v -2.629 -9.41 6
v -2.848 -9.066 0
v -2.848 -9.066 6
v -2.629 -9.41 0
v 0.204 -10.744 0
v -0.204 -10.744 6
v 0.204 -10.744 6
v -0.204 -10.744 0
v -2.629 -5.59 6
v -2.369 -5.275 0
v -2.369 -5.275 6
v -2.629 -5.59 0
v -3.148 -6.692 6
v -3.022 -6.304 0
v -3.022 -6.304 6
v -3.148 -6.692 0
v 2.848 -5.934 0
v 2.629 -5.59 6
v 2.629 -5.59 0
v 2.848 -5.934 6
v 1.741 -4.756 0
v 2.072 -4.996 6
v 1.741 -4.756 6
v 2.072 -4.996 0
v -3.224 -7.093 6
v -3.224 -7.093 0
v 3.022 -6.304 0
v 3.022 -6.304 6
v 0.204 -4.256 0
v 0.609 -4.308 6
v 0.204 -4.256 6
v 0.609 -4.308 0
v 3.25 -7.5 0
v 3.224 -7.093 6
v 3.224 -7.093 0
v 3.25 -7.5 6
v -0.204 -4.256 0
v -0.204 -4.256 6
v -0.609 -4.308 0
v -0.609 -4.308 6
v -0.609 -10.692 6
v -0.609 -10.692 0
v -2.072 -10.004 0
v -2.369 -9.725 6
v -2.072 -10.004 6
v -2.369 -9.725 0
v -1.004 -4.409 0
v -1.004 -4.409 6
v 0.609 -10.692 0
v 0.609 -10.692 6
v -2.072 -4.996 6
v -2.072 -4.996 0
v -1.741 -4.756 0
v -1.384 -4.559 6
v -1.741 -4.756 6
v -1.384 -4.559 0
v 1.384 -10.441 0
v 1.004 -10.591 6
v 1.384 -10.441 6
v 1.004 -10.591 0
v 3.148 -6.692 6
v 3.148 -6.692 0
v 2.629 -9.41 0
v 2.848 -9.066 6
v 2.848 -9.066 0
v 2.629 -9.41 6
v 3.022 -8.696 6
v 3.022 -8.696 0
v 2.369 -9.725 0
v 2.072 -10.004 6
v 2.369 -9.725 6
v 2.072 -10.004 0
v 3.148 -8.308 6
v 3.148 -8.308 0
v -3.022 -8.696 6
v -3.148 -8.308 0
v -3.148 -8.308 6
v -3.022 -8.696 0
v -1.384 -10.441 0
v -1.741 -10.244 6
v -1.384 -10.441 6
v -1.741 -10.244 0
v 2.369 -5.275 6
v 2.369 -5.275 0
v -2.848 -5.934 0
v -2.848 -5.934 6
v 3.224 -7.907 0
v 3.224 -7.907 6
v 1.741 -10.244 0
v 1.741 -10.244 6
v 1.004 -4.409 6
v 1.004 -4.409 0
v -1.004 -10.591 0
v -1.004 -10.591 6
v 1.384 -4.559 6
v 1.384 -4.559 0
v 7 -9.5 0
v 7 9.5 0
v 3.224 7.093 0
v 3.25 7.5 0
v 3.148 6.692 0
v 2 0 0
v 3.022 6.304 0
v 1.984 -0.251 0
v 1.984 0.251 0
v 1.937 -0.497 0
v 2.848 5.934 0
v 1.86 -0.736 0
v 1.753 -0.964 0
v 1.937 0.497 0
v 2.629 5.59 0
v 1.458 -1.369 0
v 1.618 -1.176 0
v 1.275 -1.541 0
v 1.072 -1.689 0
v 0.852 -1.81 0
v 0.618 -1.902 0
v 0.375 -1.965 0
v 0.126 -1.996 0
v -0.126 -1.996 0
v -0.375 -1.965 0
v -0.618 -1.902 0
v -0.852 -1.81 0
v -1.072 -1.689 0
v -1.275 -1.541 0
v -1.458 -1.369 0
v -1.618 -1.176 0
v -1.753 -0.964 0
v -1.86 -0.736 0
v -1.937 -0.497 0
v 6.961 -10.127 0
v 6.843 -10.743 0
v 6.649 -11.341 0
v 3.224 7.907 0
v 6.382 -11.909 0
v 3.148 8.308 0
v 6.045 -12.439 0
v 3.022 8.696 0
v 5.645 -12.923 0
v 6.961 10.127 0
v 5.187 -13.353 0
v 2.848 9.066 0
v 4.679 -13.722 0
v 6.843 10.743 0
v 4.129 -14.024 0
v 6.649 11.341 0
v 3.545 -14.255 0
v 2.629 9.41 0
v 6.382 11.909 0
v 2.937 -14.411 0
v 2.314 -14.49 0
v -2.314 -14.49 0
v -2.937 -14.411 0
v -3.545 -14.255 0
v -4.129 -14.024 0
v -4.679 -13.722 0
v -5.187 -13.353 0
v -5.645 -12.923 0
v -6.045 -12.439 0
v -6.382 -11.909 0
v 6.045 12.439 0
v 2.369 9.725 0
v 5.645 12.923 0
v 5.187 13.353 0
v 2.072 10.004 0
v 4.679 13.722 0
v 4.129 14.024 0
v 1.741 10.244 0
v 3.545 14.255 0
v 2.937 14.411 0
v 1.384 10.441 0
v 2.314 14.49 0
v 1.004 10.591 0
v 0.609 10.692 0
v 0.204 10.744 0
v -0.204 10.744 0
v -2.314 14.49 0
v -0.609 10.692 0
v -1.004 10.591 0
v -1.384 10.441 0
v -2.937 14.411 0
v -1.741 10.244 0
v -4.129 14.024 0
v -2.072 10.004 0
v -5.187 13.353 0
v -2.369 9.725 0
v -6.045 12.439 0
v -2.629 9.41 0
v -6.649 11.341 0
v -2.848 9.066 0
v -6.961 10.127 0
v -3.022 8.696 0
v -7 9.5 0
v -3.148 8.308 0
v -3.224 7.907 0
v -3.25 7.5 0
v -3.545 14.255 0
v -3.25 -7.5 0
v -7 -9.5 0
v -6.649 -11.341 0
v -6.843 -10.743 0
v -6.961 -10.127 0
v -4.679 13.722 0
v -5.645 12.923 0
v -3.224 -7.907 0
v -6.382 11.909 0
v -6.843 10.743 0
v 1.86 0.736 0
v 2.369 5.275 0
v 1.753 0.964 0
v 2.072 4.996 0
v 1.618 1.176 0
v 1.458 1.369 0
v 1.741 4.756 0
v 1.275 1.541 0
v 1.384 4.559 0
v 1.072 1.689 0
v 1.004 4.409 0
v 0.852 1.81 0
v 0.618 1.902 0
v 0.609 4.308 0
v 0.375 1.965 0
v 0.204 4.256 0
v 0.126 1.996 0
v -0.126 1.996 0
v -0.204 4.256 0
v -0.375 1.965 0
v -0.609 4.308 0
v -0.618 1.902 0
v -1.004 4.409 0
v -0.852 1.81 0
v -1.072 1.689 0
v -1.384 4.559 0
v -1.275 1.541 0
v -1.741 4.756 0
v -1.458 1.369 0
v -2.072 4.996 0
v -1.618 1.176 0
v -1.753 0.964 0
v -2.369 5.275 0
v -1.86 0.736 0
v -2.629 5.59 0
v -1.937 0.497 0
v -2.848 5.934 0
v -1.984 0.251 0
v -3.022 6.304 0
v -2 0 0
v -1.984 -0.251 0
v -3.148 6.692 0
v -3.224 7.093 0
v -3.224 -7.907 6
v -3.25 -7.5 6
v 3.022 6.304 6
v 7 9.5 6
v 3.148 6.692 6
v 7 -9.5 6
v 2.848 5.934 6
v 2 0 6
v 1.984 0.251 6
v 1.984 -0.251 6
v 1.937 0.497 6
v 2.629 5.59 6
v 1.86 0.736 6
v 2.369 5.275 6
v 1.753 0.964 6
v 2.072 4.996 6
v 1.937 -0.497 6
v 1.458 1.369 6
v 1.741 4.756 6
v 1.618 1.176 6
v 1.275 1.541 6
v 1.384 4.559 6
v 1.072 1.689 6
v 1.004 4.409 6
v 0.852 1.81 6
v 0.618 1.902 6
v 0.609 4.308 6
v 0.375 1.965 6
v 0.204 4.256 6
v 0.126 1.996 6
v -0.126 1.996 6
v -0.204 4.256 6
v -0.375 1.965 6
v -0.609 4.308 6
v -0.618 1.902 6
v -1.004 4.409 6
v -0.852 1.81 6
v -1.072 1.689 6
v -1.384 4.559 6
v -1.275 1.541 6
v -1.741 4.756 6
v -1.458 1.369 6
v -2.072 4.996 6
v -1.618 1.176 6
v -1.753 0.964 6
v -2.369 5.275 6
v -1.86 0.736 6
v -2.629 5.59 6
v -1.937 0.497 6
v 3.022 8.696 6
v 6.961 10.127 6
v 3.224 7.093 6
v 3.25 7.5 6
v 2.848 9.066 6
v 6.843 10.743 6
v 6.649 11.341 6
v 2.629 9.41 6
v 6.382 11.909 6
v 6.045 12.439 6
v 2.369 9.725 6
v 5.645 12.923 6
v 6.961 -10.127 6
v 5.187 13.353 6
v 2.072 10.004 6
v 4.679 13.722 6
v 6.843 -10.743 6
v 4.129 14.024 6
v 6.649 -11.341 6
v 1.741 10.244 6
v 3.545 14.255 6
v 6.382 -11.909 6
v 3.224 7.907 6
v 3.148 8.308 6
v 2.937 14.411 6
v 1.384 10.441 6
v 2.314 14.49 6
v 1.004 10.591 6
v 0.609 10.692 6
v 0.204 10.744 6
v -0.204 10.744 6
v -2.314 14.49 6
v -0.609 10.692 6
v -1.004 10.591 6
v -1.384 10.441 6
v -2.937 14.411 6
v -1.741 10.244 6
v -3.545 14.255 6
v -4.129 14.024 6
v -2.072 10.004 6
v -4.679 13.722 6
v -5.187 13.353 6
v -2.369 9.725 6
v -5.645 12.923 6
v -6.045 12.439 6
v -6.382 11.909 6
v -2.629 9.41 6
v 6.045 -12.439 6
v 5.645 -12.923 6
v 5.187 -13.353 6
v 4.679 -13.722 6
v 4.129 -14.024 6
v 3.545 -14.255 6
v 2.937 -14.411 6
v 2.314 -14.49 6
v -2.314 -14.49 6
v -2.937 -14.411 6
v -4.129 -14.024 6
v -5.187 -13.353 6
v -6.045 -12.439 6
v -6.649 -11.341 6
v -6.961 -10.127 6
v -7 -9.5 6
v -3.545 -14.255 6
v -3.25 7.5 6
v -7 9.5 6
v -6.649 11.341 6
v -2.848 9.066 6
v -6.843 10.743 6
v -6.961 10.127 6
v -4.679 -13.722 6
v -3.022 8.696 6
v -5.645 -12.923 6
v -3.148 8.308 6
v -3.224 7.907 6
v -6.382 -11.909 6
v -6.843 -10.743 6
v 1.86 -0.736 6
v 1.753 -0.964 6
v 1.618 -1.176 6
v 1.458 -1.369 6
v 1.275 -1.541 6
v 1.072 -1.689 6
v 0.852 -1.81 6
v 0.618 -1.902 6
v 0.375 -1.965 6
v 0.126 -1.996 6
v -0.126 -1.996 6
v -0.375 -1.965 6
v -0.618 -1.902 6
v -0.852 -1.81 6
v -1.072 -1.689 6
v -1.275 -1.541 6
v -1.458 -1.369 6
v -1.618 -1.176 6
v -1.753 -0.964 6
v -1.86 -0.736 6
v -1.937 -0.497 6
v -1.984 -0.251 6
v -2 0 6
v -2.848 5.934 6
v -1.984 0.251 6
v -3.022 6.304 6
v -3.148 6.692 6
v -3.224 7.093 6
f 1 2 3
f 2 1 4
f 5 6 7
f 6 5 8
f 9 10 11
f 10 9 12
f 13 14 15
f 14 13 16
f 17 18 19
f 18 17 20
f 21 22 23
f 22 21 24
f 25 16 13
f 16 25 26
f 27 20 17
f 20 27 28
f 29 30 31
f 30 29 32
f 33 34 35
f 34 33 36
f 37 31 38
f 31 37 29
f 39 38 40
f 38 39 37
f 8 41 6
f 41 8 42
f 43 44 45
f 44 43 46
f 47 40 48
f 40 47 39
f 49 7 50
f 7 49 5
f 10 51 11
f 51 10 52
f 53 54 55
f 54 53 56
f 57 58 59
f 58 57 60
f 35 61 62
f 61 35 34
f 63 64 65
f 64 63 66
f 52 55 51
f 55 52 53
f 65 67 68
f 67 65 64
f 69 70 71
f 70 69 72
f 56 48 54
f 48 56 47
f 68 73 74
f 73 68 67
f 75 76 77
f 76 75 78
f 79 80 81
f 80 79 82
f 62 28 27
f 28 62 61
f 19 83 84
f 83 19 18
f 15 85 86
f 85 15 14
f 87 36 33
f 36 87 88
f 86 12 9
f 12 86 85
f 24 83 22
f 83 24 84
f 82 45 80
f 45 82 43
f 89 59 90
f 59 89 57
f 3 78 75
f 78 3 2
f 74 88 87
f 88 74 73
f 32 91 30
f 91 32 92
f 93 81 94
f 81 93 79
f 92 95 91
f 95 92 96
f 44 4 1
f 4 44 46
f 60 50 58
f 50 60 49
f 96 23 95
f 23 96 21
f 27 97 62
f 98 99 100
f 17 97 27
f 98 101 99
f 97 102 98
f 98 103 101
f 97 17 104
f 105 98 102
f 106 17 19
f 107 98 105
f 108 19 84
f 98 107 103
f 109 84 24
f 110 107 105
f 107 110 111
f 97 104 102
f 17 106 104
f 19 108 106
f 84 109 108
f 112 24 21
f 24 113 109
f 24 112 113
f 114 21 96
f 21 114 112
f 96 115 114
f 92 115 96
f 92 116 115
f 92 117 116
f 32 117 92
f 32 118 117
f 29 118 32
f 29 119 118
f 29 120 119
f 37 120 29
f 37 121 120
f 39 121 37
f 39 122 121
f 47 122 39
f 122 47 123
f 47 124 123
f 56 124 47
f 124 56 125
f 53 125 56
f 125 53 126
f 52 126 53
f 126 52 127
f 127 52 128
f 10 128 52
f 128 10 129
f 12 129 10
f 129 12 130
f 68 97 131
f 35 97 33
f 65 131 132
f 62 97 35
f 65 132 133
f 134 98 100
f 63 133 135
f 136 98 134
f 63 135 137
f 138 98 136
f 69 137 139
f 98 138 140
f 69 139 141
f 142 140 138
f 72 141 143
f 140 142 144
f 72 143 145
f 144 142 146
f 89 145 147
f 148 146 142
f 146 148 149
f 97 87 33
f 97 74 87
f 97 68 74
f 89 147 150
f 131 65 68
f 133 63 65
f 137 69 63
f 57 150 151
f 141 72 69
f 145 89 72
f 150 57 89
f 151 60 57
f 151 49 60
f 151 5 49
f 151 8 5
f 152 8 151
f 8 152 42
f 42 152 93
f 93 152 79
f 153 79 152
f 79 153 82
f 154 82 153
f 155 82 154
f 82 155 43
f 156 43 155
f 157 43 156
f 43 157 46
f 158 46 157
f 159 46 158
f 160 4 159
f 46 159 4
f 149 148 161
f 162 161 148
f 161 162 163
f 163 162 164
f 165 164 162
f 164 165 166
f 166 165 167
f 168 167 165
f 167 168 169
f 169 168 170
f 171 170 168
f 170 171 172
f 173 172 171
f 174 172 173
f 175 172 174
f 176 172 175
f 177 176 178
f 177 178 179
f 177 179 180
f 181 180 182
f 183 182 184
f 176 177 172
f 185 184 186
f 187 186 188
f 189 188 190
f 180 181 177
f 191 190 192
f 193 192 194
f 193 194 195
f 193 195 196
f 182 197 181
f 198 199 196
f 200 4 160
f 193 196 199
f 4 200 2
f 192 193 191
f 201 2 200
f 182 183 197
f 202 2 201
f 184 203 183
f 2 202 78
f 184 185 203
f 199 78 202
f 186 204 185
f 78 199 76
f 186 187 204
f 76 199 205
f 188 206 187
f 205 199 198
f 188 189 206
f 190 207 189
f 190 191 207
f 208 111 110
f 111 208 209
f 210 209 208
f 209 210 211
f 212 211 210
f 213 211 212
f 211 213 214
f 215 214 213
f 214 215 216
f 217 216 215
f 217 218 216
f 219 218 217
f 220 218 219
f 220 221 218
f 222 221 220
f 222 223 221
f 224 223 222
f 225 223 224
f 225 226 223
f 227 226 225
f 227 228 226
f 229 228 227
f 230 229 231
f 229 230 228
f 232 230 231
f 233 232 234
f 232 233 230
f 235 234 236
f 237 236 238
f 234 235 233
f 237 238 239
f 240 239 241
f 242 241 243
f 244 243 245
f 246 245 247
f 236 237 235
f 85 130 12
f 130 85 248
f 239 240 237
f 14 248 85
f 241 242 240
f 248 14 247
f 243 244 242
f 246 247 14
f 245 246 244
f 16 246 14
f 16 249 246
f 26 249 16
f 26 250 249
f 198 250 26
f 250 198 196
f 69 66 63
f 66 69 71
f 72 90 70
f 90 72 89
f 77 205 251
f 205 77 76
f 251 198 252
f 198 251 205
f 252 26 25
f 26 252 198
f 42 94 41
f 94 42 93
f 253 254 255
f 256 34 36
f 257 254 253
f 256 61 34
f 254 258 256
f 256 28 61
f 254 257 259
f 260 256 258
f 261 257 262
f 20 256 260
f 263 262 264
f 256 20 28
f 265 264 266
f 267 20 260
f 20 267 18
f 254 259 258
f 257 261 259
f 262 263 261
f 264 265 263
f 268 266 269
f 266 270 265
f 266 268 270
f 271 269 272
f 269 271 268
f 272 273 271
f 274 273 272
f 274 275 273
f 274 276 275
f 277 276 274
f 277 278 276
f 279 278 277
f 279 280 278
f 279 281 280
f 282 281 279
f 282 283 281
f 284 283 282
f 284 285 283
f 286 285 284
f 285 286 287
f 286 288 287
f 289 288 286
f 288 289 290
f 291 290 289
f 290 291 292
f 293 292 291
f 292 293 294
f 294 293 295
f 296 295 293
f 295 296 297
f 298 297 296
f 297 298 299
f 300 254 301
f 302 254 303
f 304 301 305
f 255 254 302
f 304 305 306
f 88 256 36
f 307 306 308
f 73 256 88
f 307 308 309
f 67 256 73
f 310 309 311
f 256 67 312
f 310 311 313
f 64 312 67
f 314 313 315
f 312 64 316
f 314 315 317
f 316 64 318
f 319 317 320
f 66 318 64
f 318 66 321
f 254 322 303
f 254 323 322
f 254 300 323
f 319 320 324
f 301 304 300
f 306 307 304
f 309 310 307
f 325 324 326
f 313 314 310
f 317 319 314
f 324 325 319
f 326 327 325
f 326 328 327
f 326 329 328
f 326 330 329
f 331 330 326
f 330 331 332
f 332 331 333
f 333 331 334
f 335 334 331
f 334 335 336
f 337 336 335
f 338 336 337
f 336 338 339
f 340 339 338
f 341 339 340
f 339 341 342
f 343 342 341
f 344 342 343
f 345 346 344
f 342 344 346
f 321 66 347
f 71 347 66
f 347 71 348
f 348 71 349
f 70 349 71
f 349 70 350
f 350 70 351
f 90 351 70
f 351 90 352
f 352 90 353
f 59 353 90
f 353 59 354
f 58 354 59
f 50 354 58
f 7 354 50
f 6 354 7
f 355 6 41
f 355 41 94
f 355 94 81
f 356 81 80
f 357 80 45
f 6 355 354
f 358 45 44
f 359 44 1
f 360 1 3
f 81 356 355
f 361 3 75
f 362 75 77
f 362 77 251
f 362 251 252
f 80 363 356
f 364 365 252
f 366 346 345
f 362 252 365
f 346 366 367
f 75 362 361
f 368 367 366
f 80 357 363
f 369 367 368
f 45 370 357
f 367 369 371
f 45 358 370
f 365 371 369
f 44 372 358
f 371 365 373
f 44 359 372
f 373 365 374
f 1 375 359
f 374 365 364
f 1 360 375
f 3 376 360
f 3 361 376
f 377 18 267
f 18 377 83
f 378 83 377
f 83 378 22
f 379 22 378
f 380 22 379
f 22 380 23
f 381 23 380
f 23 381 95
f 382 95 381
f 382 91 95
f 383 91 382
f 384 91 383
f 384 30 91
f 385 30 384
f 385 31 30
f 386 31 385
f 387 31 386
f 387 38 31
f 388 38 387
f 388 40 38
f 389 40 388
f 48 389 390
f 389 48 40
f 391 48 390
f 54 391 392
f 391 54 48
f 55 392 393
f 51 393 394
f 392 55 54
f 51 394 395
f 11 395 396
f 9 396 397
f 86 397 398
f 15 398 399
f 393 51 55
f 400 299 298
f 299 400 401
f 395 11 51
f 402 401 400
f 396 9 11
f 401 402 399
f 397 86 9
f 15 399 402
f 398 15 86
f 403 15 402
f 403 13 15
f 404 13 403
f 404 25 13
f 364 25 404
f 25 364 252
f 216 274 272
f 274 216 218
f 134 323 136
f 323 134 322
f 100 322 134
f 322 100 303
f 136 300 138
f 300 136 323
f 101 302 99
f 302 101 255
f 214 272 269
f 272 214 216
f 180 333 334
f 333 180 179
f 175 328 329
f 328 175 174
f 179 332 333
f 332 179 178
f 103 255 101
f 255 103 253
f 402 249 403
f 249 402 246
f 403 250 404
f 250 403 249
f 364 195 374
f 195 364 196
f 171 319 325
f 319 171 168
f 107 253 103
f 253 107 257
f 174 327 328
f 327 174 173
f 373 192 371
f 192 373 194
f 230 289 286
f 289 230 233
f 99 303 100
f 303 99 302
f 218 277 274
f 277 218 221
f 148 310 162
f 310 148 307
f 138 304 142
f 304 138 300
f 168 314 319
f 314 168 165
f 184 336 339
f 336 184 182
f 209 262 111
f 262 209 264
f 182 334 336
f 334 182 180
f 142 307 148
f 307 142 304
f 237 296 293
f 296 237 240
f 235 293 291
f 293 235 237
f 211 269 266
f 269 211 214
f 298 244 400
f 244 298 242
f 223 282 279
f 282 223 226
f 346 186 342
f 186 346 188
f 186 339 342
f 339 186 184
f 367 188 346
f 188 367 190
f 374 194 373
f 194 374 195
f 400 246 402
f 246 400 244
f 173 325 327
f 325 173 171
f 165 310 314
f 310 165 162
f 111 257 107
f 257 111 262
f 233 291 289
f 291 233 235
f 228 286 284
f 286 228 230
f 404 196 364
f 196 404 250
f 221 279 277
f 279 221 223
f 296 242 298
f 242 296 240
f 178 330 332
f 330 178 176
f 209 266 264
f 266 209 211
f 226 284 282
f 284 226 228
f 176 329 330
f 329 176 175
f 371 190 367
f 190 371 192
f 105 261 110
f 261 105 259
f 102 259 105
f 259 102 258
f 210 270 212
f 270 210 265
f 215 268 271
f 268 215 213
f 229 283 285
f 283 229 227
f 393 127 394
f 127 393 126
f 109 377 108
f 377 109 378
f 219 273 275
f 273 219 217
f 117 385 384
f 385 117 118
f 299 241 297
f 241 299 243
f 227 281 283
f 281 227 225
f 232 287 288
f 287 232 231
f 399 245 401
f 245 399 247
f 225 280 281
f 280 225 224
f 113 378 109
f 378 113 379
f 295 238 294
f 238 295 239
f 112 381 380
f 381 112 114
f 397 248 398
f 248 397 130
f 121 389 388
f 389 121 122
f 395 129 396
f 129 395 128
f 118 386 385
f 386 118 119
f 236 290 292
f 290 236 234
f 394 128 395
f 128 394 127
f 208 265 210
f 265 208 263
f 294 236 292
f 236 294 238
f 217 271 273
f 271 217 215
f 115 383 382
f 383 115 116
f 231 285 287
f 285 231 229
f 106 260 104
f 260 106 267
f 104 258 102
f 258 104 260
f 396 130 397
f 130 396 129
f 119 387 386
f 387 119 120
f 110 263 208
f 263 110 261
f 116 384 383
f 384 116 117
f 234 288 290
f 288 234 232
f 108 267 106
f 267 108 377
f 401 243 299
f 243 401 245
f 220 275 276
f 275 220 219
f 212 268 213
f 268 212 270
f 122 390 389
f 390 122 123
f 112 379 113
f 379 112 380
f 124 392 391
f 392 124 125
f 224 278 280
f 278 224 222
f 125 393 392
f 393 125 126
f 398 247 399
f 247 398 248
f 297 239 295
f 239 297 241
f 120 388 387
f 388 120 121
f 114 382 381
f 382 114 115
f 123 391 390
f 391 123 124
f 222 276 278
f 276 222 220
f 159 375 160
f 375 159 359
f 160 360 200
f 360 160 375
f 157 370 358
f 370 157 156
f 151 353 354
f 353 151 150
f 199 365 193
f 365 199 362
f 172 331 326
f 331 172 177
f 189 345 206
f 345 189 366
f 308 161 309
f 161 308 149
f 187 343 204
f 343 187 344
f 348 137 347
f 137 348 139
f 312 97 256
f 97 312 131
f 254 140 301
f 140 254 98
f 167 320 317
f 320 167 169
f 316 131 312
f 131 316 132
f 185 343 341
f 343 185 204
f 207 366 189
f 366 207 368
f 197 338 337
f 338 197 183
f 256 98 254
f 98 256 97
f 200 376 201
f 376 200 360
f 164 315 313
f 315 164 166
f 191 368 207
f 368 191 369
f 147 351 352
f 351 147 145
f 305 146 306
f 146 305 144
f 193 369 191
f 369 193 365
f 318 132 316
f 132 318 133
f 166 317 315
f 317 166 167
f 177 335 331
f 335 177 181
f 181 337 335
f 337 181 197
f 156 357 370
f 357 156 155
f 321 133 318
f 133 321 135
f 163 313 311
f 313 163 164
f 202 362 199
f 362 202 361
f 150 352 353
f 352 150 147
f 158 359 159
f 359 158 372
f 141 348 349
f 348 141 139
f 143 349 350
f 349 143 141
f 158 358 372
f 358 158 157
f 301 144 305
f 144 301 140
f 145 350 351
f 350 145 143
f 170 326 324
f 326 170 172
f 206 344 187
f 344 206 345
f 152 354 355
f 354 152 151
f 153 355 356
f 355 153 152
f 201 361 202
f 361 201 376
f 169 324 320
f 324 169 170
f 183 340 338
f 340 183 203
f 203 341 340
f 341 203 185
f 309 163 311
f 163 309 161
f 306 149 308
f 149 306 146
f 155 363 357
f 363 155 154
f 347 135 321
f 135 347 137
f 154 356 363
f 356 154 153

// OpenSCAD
$fn = 50;

difference() {
	union() {
		hull() {
			translate(v = [-2.0, 9.5, 0]) {
				cylinder(h = 6, r = 5);
			}
			translate(v = [2.0, 9.5, 0]) {
				cylinder(h = 6, r = 5);
			}
			translate(v = [-2.0, -9.5, 0]) {
				cylinder(h = 6, r = 5);
			}
			translate(v = [2.0, -9.5, 0]) {
				cylinder(h = 6, r = 5);
			}
		}
	}
	union() {
		translate(v = [0.0, -7.5, 0]) {
			cylinder(h = 6, r = 3.25);
		}
		translate(v = [0.0, 7.5, 0]) {
			cylinder(h = 6, r = 3.25);
		}
		cylinder(h = 6, r = 2.0);
	}
}
